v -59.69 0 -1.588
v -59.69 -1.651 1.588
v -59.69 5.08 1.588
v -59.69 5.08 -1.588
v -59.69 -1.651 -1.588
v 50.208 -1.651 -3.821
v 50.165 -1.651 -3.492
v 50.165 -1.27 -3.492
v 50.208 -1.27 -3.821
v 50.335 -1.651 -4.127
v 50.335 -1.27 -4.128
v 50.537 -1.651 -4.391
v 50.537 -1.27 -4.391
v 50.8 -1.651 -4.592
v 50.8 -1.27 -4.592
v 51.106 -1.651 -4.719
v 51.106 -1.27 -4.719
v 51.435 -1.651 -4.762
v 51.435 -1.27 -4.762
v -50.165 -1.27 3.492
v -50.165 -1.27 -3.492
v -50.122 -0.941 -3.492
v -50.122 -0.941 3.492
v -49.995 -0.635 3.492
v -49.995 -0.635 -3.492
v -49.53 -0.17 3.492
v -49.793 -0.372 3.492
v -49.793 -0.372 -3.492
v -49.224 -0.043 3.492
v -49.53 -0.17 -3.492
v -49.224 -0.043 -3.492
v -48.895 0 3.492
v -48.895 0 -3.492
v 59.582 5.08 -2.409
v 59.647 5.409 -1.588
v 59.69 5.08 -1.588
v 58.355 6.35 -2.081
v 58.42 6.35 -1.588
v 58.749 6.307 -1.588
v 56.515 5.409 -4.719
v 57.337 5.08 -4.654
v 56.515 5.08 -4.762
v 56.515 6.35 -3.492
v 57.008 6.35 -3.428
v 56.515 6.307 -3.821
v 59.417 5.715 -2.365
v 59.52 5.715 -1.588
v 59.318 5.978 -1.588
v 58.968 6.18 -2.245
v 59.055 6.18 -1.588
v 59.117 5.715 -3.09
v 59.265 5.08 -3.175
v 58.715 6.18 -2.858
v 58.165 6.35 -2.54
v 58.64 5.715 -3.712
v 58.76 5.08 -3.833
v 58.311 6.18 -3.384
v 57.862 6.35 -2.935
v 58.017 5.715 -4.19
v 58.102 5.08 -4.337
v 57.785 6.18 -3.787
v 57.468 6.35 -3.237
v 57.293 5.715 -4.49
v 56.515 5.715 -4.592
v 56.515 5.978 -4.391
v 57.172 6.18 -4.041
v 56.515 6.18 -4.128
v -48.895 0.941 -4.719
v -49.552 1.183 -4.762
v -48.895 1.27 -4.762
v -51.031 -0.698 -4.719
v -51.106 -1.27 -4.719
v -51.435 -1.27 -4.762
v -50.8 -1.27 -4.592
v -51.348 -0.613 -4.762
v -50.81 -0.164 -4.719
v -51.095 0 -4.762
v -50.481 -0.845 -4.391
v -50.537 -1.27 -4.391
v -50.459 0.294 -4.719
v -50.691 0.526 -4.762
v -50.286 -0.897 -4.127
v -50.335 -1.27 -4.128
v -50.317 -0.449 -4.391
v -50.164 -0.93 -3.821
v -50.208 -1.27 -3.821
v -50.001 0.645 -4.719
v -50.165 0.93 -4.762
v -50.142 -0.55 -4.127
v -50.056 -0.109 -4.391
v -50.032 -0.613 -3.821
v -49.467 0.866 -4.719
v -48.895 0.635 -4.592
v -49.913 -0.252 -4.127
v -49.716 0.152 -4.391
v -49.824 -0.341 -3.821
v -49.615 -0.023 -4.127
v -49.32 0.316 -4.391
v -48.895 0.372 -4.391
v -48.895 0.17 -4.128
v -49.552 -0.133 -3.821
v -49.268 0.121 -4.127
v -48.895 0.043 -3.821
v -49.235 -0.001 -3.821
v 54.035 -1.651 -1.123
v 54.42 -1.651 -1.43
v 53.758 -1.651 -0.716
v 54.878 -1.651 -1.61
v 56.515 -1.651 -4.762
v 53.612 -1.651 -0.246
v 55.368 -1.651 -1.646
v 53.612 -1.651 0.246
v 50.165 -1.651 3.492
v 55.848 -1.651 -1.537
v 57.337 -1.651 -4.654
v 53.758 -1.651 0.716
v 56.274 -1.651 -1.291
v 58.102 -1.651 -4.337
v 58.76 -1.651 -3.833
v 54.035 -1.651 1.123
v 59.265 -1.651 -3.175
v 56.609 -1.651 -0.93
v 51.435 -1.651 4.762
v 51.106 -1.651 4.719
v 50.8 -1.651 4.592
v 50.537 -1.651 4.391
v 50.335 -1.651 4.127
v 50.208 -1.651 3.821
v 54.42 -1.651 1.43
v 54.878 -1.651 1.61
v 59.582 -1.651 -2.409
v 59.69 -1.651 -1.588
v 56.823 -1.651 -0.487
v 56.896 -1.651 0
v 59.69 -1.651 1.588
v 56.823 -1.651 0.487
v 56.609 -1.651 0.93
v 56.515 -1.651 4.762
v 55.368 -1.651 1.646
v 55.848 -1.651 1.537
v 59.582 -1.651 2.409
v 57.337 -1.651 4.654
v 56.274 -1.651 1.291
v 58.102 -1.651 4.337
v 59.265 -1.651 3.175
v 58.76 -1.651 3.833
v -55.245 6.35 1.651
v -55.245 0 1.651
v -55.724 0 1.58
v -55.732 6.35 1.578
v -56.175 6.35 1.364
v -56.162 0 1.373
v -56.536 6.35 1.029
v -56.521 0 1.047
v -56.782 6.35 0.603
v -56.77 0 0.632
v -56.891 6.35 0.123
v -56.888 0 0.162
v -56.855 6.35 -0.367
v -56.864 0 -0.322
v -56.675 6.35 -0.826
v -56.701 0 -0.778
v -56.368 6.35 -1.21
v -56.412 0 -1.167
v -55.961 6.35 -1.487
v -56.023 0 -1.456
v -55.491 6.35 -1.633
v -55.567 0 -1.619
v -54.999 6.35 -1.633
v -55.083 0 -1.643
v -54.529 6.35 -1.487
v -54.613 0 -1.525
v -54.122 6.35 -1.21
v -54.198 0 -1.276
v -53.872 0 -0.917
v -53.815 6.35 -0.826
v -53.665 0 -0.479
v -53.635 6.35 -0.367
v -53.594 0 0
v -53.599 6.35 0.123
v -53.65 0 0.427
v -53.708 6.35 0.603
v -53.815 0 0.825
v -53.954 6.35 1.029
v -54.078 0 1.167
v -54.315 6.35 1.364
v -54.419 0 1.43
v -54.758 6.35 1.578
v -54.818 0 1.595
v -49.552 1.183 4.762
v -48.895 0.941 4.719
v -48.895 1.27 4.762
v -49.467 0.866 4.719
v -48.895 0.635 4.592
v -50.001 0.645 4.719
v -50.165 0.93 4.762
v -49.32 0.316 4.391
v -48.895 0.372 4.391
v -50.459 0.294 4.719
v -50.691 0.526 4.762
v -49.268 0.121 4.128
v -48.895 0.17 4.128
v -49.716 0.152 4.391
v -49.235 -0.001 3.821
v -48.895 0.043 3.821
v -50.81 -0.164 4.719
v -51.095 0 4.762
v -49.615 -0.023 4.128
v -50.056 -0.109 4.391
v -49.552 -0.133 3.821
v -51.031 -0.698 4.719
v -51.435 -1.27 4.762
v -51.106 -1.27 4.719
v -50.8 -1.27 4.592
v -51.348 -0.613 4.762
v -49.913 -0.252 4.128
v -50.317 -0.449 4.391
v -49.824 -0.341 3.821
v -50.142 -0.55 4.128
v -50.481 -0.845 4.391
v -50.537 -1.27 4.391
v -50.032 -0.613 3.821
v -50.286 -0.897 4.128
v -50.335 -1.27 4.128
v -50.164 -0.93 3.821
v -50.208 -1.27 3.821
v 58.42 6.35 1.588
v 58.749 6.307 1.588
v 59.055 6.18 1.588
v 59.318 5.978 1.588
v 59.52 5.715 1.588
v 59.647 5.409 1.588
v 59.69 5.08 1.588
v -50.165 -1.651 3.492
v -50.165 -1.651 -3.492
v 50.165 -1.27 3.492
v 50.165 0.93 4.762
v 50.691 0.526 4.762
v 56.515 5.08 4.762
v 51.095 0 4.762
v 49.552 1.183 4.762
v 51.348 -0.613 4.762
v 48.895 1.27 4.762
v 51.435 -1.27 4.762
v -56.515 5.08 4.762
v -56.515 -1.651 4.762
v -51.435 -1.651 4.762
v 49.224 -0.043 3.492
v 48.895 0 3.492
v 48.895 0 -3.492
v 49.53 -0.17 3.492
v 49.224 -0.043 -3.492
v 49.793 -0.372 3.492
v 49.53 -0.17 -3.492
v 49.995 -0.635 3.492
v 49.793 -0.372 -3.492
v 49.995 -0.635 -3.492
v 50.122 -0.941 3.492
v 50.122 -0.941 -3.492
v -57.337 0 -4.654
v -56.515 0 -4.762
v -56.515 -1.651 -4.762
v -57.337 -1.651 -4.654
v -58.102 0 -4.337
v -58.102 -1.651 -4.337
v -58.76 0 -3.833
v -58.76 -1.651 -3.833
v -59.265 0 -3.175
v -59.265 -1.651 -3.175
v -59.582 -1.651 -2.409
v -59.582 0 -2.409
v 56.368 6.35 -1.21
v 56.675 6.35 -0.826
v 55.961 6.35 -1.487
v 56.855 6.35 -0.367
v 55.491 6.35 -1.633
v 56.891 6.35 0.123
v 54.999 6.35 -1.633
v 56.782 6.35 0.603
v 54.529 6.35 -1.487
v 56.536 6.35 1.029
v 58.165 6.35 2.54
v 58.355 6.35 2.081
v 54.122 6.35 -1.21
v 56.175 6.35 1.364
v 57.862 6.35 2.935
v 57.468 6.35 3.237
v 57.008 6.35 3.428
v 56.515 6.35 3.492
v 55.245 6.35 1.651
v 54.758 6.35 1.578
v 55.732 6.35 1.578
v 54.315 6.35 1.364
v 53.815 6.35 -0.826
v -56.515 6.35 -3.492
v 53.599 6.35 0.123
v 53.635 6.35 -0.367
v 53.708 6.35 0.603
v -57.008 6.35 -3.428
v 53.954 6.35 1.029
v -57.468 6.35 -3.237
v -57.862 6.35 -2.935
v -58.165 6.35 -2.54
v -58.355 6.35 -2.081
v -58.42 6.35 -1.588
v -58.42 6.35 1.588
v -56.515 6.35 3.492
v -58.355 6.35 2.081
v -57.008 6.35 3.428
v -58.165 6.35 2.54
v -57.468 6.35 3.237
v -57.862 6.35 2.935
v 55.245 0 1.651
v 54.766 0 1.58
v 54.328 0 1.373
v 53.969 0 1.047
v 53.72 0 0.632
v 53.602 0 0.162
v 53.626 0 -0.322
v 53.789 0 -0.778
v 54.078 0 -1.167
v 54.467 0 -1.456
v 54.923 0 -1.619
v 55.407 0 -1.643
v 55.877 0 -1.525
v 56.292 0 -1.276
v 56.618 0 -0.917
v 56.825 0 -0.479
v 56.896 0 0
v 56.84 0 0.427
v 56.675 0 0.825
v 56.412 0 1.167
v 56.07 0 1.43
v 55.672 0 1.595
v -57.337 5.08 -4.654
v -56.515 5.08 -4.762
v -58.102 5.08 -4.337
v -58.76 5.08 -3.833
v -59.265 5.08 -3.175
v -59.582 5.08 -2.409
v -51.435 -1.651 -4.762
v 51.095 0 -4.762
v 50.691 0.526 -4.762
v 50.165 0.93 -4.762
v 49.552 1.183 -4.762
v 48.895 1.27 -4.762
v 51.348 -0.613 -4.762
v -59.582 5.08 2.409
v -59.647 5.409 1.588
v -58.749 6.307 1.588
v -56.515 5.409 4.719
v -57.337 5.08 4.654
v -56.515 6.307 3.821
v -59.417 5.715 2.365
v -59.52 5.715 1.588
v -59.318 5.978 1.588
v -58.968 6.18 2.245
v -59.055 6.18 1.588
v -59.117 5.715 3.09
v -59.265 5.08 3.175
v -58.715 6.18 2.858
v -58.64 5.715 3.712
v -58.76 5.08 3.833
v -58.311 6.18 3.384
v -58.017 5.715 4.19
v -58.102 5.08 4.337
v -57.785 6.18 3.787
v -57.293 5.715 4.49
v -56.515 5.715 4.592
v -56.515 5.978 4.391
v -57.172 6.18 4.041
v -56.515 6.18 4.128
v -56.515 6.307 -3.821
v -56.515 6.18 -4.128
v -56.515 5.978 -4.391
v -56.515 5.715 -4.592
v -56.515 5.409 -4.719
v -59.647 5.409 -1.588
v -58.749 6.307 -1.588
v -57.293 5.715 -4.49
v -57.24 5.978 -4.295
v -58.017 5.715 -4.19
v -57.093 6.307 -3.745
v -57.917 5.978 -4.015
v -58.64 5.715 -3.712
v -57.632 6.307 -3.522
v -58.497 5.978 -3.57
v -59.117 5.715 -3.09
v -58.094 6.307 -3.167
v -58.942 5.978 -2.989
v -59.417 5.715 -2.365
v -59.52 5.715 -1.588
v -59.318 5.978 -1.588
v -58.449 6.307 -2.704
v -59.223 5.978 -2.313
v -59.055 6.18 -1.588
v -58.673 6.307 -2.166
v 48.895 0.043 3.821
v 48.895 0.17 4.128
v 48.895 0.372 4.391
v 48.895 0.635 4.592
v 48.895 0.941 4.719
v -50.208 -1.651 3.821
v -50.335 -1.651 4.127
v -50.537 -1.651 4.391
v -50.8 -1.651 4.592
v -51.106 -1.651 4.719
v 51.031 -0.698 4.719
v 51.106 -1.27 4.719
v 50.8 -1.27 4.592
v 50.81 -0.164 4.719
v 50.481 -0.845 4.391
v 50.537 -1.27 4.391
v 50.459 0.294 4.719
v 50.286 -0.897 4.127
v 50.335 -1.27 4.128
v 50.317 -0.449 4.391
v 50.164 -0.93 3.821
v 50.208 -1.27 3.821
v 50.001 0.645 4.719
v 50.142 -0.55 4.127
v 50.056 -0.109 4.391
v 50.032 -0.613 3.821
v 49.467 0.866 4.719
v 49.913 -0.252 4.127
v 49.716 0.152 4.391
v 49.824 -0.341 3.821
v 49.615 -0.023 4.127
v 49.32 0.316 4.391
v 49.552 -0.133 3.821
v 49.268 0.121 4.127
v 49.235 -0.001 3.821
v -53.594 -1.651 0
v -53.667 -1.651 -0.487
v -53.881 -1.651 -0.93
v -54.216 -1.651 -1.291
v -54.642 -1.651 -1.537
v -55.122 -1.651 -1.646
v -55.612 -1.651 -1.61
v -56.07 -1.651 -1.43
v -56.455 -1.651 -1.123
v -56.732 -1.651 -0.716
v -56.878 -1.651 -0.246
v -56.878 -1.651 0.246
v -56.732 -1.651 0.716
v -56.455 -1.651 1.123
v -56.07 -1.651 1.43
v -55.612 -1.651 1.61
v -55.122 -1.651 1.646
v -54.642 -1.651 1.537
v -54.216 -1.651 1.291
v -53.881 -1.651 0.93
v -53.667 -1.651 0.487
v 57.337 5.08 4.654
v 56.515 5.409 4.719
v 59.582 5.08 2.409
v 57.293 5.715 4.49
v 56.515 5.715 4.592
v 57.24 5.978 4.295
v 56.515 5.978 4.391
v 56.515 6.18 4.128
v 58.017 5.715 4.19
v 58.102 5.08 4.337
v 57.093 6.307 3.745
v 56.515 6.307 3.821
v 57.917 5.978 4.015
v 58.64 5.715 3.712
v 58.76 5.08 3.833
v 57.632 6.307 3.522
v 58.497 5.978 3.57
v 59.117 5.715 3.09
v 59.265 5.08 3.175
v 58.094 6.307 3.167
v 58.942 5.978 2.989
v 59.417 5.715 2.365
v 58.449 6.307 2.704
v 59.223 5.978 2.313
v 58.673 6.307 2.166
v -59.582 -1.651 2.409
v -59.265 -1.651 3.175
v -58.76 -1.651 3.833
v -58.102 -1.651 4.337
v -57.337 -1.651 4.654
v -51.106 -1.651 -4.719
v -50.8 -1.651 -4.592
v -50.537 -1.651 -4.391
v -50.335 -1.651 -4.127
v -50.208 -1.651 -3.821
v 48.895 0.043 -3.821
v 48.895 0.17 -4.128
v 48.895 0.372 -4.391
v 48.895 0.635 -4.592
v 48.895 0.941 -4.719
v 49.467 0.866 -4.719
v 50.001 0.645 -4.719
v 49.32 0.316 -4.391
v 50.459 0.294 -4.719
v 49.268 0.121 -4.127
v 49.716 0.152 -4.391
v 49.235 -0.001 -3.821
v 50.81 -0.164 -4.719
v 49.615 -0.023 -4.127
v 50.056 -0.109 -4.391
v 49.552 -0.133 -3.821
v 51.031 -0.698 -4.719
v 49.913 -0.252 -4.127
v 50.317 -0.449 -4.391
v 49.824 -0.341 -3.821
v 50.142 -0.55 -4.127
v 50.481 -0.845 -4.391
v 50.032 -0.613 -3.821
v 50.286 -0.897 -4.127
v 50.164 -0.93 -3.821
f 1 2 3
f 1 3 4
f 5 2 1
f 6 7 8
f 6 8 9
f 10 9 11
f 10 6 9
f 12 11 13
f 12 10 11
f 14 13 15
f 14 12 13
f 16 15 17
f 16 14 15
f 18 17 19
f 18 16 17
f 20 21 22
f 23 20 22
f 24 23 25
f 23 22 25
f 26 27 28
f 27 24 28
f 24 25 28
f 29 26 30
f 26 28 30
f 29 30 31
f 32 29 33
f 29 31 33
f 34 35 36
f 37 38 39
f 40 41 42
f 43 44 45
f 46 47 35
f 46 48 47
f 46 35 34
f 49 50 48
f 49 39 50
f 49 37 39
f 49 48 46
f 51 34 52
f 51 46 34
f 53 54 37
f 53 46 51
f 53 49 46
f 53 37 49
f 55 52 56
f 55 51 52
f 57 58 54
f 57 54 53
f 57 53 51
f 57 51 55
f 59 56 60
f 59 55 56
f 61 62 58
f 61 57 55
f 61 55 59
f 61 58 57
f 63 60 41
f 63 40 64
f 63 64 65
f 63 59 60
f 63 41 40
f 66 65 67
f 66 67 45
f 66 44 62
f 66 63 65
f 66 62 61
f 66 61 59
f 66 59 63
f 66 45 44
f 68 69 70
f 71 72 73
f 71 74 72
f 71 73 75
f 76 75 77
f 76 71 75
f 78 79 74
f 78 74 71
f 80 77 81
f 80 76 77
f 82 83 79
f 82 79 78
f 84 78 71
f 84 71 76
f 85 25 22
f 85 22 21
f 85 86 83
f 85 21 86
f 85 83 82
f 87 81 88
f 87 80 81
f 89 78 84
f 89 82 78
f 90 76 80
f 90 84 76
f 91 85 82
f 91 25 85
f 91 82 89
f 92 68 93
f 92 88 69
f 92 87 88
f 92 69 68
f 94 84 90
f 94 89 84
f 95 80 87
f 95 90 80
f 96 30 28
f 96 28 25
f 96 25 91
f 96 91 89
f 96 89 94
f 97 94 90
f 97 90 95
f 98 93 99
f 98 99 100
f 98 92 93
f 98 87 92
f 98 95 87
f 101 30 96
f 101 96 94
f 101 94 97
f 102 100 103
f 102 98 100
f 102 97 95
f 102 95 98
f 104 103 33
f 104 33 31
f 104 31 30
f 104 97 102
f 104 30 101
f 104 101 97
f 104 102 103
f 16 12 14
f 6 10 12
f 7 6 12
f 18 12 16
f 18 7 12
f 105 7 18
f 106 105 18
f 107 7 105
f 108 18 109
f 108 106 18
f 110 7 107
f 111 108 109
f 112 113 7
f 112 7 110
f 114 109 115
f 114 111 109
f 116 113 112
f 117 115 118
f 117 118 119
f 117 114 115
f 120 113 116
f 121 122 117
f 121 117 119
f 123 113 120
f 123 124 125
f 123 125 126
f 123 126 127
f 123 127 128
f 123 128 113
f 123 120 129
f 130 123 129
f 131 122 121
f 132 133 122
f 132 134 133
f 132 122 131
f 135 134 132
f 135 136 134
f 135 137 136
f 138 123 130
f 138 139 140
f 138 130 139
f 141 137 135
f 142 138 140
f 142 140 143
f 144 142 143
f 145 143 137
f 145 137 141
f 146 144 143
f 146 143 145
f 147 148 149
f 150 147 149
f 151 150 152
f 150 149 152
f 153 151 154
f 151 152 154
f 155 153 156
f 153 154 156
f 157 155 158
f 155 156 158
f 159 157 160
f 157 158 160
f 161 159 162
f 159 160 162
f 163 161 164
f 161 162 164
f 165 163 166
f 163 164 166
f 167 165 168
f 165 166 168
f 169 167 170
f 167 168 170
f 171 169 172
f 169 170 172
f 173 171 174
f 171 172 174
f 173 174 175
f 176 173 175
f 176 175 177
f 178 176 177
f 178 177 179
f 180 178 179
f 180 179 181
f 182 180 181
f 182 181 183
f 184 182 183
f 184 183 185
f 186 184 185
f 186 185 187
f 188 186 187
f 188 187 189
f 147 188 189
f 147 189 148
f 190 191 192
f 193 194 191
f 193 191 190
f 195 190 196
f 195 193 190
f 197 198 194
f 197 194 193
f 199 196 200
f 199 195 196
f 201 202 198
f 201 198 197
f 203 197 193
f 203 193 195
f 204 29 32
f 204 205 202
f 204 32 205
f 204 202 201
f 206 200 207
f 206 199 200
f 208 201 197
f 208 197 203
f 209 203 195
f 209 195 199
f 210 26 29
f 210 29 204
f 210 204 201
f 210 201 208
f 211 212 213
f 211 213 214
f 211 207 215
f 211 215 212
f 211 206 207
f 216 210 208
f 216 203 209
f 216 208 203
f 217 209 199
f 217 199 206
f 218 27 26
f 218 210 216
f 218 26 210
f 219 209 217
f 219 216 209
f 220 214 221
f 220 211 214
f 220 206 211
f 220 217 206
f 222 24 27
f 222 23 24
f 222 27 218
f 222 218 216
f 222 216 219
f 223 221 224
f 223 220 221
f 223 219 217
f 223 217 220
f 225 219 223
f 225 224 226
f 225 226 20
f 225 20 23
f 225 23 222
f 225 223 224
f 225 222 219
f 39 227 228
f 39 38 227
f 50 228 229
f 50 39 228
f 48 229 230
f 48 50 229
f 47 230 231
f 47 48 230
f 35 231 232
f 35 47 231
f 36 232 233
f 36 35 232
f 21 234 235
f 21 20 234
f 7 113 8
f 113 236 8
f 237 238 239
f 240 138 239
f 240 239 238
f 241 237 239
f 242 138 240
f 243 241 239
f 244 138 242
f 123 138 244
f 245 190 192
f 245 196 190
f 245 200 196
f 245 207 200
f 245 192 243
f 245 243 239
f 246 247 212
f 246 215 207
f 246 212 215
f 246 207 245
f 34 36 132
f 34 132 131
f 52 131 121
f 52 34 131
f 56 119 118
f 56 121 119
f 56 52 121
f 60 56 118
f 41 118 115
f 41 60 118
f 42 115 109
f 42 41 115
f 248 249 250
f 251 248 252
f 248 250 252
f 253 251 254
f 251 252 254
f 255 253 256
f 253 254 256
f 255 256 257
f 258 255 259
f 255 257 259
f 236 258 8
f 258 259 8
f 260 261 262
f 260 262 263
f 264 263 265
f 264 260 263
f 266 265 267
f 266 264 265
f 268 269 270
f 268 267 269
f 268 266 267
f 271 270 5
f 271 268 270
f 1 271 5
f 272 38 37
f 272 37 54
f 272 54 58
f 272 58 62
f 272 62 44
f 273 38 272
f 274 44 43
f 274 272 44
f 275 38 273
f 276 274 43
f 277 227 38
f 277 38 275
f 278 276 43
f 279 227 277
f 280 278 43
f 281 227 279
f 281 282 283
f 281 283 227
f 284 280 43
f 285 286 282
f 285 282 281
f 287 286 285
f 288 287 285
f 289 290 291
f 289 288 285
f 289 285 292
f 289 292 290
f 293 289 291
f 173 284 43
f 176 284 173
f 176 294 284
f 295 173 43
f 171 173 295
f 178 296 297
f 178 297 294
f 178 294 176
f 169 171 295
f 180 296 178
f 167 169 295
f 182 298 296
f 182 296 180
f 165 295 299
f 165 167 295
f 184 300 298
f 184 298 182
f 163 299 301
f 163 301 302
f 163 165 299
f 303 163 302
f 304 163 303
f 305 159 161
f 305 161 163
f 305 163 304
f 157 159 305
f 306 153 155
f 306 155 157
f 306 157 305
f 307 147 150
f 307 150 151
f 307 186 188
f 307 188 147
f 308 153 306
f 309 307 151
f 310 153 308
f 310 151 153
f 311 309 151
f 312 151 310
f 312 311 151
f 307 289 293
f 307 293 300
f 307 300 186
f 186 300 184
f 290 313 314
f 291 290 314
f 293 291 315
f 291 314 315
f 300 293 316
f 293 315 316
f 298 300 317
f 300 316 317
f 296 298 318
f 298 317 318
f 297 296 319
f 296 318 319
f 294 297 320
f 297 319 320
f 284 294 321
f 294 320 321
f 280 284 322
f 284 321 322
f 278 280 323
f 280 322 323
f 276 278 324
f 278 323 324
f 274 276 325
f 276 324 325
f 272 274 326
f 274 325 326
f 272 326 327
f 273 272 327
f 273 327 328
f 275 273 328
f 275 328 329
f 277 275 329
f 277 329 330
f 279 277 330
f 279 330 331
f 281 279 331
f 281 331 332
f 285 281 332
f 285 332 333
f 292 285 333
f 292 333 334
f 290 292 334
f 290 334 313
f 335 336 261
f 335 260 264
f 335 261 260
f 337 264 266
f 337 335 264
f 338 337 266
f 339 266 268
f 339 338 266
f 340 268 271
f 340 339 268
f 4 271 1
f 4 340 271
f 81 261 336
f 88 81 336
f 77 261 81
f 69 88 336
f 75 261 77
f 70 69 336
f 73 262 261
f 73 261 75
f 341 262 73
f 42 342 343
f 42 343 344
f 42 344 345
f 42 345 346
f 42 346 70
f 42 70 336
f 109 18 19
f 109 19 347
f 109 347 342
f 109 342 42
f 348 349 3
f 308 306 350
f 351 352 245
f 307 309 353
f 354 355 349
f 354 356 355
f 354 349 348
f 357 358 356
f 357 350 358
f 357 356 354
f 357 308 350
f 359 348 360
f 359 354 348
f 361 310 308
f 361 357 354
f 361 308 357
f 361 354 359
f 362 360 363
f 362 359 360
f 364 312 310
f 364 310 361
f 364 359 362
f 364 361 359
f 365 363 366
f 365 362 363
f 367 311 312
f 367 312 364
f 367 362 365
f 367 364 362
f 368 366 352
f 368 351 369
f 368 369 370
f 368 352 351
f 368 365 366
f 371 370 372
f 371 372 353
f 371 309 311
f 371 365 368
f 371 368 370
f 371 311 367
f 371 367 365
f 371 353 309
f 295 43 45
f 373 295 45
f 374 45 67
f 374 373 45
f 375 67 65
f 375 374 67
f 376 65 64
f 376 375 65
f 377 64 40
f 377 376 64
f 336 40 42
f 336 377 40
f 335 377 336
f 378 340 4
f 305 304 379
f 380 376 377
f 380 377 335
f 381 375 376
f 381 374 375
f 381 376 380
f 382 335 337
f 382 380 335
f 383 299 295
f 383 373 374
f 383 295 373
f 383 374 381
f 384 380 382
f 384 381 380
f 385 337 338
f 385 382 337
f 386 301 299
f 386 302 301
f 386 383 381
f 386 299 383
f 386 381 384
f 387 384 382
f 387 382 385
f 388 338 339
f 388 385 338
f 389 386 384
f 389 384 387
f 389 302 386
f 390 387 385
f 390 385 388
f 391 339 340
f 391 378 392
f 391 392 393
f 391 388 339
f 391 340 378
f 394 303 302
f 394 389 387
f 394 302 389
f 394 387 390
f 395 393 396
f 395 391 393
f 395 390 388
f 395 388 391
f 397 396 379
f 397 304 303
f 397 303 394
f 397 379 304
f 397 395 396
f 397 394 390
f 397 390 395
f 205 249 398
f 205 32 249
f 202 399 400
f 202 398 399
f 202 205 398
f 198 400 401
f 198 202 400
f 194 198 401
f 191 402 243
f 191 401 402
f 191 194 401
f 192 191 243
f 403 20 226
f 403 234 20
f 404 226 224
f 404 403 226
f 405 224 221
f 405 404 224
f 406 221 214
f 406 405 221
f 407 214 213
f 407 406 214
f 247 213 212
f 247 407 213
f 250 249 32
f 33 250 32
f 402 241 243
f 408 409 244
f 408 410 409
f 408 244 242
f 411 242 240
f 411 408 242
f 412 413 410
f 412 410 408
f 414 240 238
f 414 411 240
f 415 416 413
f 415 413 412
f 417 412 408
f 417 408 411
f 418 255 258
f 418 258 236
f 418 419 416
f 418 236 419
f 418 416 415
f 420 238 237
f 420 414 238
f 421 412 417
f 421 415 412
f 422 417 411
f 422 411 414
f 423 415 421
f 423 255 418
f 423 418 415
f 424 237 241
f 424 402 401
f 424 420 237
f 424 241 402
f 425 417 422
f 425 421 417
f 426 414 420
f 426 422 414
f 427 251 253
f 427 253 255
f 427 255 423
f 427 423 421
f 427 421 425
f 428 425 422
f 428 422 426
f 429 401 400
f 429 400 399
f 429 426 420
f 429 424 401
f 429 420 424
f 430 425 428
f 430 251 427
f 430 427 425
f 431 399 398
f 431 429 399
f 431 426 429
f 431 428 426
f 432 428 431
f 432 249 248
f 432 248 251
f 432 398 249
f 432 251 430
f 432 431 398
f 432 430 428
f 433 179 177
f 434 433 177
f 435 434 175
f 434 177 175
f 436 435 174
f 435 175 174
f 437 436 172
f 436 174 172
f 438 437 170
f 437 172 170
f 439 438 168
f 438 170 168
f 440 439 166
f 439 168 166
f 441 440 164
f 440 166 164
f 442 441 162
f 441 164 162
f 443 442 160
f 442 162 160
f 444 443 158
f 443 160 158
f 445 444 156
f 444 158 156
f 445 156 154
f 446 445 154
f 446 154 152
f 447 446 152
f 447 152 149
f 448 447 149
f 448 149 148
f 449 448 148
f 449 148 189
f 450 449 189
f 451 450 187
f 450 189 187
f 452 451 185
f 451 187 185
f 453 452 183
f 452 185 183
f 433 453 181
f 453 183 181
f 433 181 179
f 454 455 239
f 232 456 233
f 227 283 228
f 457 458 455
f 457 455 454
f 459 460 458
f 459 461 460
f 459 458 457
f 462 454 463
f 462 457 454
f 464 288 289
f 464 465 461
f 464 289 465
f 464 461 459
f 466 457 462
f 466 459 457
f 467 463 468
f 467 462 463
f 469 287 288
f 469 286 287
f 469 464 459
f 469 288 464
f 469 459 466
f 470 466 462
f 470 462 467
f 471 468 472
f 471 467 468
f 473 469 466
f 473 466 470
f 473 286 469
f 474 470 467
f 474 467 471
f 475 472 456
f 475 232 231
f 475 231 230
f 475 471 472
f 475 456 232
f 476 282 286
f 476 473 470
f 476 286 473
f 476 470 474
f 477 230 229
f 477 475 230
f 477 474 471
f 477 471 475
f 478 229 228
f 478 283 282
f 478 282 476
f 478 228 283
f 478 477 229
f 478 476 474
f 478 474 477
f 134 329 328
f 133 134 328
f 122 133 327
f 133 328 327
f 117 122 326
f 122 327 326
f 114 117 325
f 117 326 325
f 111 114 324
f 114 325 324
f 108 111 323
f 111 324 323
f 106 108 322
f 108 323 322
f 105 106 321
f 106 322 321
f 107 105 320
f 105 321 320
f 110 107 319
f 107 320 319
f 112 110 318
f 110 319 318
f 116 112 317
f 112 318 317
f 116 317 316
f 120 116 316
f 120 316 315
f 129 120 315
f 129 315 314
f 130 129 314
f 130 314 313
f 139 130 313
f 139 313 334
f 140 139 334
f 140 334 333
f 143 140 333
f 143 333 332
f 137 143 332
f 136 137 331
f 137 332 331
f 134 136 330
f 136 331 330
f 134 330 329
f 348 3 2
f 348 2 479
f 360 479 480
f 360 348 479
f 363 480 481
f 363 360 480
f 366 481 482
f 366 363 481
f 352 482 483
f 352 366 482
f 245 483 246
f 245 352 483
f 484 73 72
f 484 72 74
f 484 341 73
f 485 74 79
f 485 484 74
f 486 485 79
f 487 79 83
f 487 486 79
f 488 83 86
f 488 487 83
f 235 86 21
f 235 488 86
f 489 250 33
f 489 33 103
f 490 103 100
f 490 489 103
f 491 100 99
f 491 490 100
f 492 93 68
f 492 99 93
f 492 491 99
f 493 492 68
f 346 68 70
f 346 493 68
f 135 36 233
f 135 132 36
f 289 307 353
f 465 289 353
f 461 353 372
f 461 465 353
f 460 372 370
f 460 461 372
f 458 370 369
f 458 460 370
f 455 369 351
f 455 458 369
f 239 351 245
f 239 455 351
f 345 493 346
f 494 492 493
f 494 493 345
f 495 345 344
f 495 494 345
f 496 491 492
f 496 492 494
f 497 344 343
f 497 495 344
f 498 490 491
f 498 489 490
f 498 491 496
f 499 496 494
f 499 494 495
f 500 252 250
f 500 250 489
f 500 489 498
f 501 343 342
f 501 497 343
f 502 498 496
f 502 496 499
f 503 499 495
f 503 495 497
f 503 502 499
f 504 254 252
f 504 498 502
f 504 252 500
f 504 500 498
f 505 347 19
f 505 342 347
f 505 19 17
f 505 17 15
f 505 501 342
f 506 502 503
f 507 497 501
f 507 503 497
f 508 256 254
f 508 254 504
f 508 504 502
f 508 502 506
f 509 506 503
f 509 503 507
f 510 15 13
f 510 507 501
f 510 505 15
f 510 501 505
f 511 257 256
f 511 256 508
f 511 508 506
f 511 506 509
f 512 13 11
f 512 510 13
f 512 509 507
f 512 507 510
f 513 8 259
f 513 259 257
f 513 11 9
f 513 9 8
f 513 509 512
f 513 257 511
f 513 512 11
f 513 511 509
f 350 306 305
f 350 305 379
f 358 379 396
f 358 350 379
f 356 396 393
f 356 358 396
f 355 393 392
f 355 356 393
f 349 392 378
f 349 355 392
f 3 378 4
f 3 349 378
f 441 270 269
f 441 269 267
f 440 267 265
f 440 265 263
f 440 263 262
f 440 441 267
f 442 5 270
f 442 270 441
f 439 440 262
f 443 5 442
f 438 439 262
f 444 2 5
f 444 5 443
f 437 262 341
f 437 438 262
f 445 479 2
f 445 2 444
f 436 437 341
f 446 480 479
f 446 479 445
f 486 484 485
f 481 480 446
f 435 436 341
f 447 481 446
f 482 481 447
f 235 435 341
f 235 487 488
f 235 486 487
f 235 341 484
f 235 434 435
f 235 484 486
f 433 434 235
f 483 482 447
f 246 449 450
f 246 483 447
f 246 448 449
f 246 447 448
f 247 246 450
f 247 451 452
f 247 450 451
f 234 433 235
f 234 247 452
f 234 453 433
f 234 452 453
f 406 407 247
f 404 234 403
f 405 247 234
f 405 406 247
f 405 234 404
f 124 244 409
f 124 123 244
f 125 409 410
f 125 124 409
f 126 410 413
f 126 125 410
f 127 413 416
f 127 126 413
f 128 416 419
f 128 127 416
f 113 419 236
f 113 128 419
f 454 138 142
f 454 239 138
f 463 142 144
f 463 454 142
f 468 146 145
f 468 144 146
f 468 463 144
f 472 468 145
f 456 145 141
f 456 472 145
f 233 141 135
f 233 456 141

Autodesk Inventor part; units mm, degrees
ref_plane "YZ Plane" through (0, 0, 0) normal (1, 0, 0) x (0, 1, 0)
ref_plane "XZ Plane" through (0, 0, 0) normal (0, 1, 0) x (-1, 0, 0)
ref_plane "XY Plane" through (0, 0, 0) normal (0, 0, 1) x (1, 0, 0)
sketch "Sketch1" plane through (0, 0, 0) normal (0, 1, 0) x (-1, 0, 0)
  line L0 (-59.69, 4.7625) -> (59.69, 4.7625)
  line L1 (59.69, 4.7625) -> (59.69, -4.7625)
  line L2 (59.69, -4.7625) -> (-59.69, -4.7625)
  line L3 (-59.69, -4.7625) -> (-59.69, 4.7625)
  point P0 (0, 0)
  point P1 (0, 4.7625)
  point P2 (-59.69, 0)
  dimension "d0" = 119.38
  dimension "d1" = 9.525
extrude "Extrusion1" add sketch "Sketch1" along normal blind 6.35
sketch "Sketch2" plane through (0, 6.35, 0) normal (0, 1, 0) x (1, 0, 0)
  point P0 (0, 0)
  point P1 (-55.245, 0)
  point P2 (55.245, 0)
  dimension "d4" = 55.245
  dimension "d5" = 55.245
hole "Hole1" at (-55.245, 6.35, 0) at (55.245, 6.35, 0) direction (0, -1, 0) diameter 3.302 depth 25.4 tip angle 118
fillet "Fillet1" radius 3.175 4 edges at (-59.69, 3.175, 4.7625) (-59.69, 3.175, -4.7625) (59.69, 3.175, 4.7625) (59.69, 3.175, -4.7625)
fillet "Fillet2" radius 1.27 8 edges at (58.7601, 6.35, 3.8326) (59.69, 6.35, 0) (58.7601, 6.35, -3.8326) (0, 6.35, -4.7625) (-58.7601, 6.35, -3.8326) (-59.69, 6.35, 0) (-58.7601, 6.35, 3.8326) (0, 6.35, 4.7625)
sketch "Sketch3" plane through (0, 0, 0) normal (0, -1, 0) x (1, 0, 0)
  arc A0 (56.515, -4.7625) -> (59.69, -1.5875) centre (56.515, -1.5875) ccw projected
  line L0 (59.69, -1.5875) -> (59.69, 1.5875) projected
  arc A1 (59.69, 1.5875) -> (56.515, 4.7625) centre (56.515, 1.5875) ccw projected
  line L1 (56.515, 4.7625) -> (-56.515, 4.7625) projected
  arc A2 (-56.515, 4.7625) -> (-59.69, 1.5875) centre (-56.515, 1.5875) ccw projected
  line L2 (-59.69, 1.5875) -> (-59.69, -1.5875) projected
  arc A3 (-59.69, -1.5875) -> (-56.515, -4.7625) centre (-56.515, -1.5875) ccw projected
  line L3 (-56.515, -4.7625) -> (56.515, -4.7625) projected
  circle A4 centre (-55.245, 0) radius 1.651 projected
  circle A5 centre (55.245, 0) radius 1.651 projected
  line L4 (-50.165, 4.7625) -> (-50.165, -4.7625)
  line L5 (50.165, 4.7625) -> (50.165, -4.7625)
  point P0 (0, 0)
  dimension "d15" = 9.525
  dimension "d16" = 9.525
extrude "Extrusion2" add sketch "Sketch3" along normal blind 1.651 contours L3 L5 L1 A1 L0 A0 | L3 A3 L2 A2 L1 L4
fillet "Fillet3" radius 1.27 8 edges at (0, 0, 4.7625) (-50.165, -0.8255, 4.7625) (-50.165, -0.8255, -4.7625) (-50.165, 0, 0) (0, 0, -4.7625) (50.165, -0.8255, 4.7625) (50.165, 0, 0) (50.165, -0.8255, -4.7625)
properties part number "BatteryHolderTopStrap"
